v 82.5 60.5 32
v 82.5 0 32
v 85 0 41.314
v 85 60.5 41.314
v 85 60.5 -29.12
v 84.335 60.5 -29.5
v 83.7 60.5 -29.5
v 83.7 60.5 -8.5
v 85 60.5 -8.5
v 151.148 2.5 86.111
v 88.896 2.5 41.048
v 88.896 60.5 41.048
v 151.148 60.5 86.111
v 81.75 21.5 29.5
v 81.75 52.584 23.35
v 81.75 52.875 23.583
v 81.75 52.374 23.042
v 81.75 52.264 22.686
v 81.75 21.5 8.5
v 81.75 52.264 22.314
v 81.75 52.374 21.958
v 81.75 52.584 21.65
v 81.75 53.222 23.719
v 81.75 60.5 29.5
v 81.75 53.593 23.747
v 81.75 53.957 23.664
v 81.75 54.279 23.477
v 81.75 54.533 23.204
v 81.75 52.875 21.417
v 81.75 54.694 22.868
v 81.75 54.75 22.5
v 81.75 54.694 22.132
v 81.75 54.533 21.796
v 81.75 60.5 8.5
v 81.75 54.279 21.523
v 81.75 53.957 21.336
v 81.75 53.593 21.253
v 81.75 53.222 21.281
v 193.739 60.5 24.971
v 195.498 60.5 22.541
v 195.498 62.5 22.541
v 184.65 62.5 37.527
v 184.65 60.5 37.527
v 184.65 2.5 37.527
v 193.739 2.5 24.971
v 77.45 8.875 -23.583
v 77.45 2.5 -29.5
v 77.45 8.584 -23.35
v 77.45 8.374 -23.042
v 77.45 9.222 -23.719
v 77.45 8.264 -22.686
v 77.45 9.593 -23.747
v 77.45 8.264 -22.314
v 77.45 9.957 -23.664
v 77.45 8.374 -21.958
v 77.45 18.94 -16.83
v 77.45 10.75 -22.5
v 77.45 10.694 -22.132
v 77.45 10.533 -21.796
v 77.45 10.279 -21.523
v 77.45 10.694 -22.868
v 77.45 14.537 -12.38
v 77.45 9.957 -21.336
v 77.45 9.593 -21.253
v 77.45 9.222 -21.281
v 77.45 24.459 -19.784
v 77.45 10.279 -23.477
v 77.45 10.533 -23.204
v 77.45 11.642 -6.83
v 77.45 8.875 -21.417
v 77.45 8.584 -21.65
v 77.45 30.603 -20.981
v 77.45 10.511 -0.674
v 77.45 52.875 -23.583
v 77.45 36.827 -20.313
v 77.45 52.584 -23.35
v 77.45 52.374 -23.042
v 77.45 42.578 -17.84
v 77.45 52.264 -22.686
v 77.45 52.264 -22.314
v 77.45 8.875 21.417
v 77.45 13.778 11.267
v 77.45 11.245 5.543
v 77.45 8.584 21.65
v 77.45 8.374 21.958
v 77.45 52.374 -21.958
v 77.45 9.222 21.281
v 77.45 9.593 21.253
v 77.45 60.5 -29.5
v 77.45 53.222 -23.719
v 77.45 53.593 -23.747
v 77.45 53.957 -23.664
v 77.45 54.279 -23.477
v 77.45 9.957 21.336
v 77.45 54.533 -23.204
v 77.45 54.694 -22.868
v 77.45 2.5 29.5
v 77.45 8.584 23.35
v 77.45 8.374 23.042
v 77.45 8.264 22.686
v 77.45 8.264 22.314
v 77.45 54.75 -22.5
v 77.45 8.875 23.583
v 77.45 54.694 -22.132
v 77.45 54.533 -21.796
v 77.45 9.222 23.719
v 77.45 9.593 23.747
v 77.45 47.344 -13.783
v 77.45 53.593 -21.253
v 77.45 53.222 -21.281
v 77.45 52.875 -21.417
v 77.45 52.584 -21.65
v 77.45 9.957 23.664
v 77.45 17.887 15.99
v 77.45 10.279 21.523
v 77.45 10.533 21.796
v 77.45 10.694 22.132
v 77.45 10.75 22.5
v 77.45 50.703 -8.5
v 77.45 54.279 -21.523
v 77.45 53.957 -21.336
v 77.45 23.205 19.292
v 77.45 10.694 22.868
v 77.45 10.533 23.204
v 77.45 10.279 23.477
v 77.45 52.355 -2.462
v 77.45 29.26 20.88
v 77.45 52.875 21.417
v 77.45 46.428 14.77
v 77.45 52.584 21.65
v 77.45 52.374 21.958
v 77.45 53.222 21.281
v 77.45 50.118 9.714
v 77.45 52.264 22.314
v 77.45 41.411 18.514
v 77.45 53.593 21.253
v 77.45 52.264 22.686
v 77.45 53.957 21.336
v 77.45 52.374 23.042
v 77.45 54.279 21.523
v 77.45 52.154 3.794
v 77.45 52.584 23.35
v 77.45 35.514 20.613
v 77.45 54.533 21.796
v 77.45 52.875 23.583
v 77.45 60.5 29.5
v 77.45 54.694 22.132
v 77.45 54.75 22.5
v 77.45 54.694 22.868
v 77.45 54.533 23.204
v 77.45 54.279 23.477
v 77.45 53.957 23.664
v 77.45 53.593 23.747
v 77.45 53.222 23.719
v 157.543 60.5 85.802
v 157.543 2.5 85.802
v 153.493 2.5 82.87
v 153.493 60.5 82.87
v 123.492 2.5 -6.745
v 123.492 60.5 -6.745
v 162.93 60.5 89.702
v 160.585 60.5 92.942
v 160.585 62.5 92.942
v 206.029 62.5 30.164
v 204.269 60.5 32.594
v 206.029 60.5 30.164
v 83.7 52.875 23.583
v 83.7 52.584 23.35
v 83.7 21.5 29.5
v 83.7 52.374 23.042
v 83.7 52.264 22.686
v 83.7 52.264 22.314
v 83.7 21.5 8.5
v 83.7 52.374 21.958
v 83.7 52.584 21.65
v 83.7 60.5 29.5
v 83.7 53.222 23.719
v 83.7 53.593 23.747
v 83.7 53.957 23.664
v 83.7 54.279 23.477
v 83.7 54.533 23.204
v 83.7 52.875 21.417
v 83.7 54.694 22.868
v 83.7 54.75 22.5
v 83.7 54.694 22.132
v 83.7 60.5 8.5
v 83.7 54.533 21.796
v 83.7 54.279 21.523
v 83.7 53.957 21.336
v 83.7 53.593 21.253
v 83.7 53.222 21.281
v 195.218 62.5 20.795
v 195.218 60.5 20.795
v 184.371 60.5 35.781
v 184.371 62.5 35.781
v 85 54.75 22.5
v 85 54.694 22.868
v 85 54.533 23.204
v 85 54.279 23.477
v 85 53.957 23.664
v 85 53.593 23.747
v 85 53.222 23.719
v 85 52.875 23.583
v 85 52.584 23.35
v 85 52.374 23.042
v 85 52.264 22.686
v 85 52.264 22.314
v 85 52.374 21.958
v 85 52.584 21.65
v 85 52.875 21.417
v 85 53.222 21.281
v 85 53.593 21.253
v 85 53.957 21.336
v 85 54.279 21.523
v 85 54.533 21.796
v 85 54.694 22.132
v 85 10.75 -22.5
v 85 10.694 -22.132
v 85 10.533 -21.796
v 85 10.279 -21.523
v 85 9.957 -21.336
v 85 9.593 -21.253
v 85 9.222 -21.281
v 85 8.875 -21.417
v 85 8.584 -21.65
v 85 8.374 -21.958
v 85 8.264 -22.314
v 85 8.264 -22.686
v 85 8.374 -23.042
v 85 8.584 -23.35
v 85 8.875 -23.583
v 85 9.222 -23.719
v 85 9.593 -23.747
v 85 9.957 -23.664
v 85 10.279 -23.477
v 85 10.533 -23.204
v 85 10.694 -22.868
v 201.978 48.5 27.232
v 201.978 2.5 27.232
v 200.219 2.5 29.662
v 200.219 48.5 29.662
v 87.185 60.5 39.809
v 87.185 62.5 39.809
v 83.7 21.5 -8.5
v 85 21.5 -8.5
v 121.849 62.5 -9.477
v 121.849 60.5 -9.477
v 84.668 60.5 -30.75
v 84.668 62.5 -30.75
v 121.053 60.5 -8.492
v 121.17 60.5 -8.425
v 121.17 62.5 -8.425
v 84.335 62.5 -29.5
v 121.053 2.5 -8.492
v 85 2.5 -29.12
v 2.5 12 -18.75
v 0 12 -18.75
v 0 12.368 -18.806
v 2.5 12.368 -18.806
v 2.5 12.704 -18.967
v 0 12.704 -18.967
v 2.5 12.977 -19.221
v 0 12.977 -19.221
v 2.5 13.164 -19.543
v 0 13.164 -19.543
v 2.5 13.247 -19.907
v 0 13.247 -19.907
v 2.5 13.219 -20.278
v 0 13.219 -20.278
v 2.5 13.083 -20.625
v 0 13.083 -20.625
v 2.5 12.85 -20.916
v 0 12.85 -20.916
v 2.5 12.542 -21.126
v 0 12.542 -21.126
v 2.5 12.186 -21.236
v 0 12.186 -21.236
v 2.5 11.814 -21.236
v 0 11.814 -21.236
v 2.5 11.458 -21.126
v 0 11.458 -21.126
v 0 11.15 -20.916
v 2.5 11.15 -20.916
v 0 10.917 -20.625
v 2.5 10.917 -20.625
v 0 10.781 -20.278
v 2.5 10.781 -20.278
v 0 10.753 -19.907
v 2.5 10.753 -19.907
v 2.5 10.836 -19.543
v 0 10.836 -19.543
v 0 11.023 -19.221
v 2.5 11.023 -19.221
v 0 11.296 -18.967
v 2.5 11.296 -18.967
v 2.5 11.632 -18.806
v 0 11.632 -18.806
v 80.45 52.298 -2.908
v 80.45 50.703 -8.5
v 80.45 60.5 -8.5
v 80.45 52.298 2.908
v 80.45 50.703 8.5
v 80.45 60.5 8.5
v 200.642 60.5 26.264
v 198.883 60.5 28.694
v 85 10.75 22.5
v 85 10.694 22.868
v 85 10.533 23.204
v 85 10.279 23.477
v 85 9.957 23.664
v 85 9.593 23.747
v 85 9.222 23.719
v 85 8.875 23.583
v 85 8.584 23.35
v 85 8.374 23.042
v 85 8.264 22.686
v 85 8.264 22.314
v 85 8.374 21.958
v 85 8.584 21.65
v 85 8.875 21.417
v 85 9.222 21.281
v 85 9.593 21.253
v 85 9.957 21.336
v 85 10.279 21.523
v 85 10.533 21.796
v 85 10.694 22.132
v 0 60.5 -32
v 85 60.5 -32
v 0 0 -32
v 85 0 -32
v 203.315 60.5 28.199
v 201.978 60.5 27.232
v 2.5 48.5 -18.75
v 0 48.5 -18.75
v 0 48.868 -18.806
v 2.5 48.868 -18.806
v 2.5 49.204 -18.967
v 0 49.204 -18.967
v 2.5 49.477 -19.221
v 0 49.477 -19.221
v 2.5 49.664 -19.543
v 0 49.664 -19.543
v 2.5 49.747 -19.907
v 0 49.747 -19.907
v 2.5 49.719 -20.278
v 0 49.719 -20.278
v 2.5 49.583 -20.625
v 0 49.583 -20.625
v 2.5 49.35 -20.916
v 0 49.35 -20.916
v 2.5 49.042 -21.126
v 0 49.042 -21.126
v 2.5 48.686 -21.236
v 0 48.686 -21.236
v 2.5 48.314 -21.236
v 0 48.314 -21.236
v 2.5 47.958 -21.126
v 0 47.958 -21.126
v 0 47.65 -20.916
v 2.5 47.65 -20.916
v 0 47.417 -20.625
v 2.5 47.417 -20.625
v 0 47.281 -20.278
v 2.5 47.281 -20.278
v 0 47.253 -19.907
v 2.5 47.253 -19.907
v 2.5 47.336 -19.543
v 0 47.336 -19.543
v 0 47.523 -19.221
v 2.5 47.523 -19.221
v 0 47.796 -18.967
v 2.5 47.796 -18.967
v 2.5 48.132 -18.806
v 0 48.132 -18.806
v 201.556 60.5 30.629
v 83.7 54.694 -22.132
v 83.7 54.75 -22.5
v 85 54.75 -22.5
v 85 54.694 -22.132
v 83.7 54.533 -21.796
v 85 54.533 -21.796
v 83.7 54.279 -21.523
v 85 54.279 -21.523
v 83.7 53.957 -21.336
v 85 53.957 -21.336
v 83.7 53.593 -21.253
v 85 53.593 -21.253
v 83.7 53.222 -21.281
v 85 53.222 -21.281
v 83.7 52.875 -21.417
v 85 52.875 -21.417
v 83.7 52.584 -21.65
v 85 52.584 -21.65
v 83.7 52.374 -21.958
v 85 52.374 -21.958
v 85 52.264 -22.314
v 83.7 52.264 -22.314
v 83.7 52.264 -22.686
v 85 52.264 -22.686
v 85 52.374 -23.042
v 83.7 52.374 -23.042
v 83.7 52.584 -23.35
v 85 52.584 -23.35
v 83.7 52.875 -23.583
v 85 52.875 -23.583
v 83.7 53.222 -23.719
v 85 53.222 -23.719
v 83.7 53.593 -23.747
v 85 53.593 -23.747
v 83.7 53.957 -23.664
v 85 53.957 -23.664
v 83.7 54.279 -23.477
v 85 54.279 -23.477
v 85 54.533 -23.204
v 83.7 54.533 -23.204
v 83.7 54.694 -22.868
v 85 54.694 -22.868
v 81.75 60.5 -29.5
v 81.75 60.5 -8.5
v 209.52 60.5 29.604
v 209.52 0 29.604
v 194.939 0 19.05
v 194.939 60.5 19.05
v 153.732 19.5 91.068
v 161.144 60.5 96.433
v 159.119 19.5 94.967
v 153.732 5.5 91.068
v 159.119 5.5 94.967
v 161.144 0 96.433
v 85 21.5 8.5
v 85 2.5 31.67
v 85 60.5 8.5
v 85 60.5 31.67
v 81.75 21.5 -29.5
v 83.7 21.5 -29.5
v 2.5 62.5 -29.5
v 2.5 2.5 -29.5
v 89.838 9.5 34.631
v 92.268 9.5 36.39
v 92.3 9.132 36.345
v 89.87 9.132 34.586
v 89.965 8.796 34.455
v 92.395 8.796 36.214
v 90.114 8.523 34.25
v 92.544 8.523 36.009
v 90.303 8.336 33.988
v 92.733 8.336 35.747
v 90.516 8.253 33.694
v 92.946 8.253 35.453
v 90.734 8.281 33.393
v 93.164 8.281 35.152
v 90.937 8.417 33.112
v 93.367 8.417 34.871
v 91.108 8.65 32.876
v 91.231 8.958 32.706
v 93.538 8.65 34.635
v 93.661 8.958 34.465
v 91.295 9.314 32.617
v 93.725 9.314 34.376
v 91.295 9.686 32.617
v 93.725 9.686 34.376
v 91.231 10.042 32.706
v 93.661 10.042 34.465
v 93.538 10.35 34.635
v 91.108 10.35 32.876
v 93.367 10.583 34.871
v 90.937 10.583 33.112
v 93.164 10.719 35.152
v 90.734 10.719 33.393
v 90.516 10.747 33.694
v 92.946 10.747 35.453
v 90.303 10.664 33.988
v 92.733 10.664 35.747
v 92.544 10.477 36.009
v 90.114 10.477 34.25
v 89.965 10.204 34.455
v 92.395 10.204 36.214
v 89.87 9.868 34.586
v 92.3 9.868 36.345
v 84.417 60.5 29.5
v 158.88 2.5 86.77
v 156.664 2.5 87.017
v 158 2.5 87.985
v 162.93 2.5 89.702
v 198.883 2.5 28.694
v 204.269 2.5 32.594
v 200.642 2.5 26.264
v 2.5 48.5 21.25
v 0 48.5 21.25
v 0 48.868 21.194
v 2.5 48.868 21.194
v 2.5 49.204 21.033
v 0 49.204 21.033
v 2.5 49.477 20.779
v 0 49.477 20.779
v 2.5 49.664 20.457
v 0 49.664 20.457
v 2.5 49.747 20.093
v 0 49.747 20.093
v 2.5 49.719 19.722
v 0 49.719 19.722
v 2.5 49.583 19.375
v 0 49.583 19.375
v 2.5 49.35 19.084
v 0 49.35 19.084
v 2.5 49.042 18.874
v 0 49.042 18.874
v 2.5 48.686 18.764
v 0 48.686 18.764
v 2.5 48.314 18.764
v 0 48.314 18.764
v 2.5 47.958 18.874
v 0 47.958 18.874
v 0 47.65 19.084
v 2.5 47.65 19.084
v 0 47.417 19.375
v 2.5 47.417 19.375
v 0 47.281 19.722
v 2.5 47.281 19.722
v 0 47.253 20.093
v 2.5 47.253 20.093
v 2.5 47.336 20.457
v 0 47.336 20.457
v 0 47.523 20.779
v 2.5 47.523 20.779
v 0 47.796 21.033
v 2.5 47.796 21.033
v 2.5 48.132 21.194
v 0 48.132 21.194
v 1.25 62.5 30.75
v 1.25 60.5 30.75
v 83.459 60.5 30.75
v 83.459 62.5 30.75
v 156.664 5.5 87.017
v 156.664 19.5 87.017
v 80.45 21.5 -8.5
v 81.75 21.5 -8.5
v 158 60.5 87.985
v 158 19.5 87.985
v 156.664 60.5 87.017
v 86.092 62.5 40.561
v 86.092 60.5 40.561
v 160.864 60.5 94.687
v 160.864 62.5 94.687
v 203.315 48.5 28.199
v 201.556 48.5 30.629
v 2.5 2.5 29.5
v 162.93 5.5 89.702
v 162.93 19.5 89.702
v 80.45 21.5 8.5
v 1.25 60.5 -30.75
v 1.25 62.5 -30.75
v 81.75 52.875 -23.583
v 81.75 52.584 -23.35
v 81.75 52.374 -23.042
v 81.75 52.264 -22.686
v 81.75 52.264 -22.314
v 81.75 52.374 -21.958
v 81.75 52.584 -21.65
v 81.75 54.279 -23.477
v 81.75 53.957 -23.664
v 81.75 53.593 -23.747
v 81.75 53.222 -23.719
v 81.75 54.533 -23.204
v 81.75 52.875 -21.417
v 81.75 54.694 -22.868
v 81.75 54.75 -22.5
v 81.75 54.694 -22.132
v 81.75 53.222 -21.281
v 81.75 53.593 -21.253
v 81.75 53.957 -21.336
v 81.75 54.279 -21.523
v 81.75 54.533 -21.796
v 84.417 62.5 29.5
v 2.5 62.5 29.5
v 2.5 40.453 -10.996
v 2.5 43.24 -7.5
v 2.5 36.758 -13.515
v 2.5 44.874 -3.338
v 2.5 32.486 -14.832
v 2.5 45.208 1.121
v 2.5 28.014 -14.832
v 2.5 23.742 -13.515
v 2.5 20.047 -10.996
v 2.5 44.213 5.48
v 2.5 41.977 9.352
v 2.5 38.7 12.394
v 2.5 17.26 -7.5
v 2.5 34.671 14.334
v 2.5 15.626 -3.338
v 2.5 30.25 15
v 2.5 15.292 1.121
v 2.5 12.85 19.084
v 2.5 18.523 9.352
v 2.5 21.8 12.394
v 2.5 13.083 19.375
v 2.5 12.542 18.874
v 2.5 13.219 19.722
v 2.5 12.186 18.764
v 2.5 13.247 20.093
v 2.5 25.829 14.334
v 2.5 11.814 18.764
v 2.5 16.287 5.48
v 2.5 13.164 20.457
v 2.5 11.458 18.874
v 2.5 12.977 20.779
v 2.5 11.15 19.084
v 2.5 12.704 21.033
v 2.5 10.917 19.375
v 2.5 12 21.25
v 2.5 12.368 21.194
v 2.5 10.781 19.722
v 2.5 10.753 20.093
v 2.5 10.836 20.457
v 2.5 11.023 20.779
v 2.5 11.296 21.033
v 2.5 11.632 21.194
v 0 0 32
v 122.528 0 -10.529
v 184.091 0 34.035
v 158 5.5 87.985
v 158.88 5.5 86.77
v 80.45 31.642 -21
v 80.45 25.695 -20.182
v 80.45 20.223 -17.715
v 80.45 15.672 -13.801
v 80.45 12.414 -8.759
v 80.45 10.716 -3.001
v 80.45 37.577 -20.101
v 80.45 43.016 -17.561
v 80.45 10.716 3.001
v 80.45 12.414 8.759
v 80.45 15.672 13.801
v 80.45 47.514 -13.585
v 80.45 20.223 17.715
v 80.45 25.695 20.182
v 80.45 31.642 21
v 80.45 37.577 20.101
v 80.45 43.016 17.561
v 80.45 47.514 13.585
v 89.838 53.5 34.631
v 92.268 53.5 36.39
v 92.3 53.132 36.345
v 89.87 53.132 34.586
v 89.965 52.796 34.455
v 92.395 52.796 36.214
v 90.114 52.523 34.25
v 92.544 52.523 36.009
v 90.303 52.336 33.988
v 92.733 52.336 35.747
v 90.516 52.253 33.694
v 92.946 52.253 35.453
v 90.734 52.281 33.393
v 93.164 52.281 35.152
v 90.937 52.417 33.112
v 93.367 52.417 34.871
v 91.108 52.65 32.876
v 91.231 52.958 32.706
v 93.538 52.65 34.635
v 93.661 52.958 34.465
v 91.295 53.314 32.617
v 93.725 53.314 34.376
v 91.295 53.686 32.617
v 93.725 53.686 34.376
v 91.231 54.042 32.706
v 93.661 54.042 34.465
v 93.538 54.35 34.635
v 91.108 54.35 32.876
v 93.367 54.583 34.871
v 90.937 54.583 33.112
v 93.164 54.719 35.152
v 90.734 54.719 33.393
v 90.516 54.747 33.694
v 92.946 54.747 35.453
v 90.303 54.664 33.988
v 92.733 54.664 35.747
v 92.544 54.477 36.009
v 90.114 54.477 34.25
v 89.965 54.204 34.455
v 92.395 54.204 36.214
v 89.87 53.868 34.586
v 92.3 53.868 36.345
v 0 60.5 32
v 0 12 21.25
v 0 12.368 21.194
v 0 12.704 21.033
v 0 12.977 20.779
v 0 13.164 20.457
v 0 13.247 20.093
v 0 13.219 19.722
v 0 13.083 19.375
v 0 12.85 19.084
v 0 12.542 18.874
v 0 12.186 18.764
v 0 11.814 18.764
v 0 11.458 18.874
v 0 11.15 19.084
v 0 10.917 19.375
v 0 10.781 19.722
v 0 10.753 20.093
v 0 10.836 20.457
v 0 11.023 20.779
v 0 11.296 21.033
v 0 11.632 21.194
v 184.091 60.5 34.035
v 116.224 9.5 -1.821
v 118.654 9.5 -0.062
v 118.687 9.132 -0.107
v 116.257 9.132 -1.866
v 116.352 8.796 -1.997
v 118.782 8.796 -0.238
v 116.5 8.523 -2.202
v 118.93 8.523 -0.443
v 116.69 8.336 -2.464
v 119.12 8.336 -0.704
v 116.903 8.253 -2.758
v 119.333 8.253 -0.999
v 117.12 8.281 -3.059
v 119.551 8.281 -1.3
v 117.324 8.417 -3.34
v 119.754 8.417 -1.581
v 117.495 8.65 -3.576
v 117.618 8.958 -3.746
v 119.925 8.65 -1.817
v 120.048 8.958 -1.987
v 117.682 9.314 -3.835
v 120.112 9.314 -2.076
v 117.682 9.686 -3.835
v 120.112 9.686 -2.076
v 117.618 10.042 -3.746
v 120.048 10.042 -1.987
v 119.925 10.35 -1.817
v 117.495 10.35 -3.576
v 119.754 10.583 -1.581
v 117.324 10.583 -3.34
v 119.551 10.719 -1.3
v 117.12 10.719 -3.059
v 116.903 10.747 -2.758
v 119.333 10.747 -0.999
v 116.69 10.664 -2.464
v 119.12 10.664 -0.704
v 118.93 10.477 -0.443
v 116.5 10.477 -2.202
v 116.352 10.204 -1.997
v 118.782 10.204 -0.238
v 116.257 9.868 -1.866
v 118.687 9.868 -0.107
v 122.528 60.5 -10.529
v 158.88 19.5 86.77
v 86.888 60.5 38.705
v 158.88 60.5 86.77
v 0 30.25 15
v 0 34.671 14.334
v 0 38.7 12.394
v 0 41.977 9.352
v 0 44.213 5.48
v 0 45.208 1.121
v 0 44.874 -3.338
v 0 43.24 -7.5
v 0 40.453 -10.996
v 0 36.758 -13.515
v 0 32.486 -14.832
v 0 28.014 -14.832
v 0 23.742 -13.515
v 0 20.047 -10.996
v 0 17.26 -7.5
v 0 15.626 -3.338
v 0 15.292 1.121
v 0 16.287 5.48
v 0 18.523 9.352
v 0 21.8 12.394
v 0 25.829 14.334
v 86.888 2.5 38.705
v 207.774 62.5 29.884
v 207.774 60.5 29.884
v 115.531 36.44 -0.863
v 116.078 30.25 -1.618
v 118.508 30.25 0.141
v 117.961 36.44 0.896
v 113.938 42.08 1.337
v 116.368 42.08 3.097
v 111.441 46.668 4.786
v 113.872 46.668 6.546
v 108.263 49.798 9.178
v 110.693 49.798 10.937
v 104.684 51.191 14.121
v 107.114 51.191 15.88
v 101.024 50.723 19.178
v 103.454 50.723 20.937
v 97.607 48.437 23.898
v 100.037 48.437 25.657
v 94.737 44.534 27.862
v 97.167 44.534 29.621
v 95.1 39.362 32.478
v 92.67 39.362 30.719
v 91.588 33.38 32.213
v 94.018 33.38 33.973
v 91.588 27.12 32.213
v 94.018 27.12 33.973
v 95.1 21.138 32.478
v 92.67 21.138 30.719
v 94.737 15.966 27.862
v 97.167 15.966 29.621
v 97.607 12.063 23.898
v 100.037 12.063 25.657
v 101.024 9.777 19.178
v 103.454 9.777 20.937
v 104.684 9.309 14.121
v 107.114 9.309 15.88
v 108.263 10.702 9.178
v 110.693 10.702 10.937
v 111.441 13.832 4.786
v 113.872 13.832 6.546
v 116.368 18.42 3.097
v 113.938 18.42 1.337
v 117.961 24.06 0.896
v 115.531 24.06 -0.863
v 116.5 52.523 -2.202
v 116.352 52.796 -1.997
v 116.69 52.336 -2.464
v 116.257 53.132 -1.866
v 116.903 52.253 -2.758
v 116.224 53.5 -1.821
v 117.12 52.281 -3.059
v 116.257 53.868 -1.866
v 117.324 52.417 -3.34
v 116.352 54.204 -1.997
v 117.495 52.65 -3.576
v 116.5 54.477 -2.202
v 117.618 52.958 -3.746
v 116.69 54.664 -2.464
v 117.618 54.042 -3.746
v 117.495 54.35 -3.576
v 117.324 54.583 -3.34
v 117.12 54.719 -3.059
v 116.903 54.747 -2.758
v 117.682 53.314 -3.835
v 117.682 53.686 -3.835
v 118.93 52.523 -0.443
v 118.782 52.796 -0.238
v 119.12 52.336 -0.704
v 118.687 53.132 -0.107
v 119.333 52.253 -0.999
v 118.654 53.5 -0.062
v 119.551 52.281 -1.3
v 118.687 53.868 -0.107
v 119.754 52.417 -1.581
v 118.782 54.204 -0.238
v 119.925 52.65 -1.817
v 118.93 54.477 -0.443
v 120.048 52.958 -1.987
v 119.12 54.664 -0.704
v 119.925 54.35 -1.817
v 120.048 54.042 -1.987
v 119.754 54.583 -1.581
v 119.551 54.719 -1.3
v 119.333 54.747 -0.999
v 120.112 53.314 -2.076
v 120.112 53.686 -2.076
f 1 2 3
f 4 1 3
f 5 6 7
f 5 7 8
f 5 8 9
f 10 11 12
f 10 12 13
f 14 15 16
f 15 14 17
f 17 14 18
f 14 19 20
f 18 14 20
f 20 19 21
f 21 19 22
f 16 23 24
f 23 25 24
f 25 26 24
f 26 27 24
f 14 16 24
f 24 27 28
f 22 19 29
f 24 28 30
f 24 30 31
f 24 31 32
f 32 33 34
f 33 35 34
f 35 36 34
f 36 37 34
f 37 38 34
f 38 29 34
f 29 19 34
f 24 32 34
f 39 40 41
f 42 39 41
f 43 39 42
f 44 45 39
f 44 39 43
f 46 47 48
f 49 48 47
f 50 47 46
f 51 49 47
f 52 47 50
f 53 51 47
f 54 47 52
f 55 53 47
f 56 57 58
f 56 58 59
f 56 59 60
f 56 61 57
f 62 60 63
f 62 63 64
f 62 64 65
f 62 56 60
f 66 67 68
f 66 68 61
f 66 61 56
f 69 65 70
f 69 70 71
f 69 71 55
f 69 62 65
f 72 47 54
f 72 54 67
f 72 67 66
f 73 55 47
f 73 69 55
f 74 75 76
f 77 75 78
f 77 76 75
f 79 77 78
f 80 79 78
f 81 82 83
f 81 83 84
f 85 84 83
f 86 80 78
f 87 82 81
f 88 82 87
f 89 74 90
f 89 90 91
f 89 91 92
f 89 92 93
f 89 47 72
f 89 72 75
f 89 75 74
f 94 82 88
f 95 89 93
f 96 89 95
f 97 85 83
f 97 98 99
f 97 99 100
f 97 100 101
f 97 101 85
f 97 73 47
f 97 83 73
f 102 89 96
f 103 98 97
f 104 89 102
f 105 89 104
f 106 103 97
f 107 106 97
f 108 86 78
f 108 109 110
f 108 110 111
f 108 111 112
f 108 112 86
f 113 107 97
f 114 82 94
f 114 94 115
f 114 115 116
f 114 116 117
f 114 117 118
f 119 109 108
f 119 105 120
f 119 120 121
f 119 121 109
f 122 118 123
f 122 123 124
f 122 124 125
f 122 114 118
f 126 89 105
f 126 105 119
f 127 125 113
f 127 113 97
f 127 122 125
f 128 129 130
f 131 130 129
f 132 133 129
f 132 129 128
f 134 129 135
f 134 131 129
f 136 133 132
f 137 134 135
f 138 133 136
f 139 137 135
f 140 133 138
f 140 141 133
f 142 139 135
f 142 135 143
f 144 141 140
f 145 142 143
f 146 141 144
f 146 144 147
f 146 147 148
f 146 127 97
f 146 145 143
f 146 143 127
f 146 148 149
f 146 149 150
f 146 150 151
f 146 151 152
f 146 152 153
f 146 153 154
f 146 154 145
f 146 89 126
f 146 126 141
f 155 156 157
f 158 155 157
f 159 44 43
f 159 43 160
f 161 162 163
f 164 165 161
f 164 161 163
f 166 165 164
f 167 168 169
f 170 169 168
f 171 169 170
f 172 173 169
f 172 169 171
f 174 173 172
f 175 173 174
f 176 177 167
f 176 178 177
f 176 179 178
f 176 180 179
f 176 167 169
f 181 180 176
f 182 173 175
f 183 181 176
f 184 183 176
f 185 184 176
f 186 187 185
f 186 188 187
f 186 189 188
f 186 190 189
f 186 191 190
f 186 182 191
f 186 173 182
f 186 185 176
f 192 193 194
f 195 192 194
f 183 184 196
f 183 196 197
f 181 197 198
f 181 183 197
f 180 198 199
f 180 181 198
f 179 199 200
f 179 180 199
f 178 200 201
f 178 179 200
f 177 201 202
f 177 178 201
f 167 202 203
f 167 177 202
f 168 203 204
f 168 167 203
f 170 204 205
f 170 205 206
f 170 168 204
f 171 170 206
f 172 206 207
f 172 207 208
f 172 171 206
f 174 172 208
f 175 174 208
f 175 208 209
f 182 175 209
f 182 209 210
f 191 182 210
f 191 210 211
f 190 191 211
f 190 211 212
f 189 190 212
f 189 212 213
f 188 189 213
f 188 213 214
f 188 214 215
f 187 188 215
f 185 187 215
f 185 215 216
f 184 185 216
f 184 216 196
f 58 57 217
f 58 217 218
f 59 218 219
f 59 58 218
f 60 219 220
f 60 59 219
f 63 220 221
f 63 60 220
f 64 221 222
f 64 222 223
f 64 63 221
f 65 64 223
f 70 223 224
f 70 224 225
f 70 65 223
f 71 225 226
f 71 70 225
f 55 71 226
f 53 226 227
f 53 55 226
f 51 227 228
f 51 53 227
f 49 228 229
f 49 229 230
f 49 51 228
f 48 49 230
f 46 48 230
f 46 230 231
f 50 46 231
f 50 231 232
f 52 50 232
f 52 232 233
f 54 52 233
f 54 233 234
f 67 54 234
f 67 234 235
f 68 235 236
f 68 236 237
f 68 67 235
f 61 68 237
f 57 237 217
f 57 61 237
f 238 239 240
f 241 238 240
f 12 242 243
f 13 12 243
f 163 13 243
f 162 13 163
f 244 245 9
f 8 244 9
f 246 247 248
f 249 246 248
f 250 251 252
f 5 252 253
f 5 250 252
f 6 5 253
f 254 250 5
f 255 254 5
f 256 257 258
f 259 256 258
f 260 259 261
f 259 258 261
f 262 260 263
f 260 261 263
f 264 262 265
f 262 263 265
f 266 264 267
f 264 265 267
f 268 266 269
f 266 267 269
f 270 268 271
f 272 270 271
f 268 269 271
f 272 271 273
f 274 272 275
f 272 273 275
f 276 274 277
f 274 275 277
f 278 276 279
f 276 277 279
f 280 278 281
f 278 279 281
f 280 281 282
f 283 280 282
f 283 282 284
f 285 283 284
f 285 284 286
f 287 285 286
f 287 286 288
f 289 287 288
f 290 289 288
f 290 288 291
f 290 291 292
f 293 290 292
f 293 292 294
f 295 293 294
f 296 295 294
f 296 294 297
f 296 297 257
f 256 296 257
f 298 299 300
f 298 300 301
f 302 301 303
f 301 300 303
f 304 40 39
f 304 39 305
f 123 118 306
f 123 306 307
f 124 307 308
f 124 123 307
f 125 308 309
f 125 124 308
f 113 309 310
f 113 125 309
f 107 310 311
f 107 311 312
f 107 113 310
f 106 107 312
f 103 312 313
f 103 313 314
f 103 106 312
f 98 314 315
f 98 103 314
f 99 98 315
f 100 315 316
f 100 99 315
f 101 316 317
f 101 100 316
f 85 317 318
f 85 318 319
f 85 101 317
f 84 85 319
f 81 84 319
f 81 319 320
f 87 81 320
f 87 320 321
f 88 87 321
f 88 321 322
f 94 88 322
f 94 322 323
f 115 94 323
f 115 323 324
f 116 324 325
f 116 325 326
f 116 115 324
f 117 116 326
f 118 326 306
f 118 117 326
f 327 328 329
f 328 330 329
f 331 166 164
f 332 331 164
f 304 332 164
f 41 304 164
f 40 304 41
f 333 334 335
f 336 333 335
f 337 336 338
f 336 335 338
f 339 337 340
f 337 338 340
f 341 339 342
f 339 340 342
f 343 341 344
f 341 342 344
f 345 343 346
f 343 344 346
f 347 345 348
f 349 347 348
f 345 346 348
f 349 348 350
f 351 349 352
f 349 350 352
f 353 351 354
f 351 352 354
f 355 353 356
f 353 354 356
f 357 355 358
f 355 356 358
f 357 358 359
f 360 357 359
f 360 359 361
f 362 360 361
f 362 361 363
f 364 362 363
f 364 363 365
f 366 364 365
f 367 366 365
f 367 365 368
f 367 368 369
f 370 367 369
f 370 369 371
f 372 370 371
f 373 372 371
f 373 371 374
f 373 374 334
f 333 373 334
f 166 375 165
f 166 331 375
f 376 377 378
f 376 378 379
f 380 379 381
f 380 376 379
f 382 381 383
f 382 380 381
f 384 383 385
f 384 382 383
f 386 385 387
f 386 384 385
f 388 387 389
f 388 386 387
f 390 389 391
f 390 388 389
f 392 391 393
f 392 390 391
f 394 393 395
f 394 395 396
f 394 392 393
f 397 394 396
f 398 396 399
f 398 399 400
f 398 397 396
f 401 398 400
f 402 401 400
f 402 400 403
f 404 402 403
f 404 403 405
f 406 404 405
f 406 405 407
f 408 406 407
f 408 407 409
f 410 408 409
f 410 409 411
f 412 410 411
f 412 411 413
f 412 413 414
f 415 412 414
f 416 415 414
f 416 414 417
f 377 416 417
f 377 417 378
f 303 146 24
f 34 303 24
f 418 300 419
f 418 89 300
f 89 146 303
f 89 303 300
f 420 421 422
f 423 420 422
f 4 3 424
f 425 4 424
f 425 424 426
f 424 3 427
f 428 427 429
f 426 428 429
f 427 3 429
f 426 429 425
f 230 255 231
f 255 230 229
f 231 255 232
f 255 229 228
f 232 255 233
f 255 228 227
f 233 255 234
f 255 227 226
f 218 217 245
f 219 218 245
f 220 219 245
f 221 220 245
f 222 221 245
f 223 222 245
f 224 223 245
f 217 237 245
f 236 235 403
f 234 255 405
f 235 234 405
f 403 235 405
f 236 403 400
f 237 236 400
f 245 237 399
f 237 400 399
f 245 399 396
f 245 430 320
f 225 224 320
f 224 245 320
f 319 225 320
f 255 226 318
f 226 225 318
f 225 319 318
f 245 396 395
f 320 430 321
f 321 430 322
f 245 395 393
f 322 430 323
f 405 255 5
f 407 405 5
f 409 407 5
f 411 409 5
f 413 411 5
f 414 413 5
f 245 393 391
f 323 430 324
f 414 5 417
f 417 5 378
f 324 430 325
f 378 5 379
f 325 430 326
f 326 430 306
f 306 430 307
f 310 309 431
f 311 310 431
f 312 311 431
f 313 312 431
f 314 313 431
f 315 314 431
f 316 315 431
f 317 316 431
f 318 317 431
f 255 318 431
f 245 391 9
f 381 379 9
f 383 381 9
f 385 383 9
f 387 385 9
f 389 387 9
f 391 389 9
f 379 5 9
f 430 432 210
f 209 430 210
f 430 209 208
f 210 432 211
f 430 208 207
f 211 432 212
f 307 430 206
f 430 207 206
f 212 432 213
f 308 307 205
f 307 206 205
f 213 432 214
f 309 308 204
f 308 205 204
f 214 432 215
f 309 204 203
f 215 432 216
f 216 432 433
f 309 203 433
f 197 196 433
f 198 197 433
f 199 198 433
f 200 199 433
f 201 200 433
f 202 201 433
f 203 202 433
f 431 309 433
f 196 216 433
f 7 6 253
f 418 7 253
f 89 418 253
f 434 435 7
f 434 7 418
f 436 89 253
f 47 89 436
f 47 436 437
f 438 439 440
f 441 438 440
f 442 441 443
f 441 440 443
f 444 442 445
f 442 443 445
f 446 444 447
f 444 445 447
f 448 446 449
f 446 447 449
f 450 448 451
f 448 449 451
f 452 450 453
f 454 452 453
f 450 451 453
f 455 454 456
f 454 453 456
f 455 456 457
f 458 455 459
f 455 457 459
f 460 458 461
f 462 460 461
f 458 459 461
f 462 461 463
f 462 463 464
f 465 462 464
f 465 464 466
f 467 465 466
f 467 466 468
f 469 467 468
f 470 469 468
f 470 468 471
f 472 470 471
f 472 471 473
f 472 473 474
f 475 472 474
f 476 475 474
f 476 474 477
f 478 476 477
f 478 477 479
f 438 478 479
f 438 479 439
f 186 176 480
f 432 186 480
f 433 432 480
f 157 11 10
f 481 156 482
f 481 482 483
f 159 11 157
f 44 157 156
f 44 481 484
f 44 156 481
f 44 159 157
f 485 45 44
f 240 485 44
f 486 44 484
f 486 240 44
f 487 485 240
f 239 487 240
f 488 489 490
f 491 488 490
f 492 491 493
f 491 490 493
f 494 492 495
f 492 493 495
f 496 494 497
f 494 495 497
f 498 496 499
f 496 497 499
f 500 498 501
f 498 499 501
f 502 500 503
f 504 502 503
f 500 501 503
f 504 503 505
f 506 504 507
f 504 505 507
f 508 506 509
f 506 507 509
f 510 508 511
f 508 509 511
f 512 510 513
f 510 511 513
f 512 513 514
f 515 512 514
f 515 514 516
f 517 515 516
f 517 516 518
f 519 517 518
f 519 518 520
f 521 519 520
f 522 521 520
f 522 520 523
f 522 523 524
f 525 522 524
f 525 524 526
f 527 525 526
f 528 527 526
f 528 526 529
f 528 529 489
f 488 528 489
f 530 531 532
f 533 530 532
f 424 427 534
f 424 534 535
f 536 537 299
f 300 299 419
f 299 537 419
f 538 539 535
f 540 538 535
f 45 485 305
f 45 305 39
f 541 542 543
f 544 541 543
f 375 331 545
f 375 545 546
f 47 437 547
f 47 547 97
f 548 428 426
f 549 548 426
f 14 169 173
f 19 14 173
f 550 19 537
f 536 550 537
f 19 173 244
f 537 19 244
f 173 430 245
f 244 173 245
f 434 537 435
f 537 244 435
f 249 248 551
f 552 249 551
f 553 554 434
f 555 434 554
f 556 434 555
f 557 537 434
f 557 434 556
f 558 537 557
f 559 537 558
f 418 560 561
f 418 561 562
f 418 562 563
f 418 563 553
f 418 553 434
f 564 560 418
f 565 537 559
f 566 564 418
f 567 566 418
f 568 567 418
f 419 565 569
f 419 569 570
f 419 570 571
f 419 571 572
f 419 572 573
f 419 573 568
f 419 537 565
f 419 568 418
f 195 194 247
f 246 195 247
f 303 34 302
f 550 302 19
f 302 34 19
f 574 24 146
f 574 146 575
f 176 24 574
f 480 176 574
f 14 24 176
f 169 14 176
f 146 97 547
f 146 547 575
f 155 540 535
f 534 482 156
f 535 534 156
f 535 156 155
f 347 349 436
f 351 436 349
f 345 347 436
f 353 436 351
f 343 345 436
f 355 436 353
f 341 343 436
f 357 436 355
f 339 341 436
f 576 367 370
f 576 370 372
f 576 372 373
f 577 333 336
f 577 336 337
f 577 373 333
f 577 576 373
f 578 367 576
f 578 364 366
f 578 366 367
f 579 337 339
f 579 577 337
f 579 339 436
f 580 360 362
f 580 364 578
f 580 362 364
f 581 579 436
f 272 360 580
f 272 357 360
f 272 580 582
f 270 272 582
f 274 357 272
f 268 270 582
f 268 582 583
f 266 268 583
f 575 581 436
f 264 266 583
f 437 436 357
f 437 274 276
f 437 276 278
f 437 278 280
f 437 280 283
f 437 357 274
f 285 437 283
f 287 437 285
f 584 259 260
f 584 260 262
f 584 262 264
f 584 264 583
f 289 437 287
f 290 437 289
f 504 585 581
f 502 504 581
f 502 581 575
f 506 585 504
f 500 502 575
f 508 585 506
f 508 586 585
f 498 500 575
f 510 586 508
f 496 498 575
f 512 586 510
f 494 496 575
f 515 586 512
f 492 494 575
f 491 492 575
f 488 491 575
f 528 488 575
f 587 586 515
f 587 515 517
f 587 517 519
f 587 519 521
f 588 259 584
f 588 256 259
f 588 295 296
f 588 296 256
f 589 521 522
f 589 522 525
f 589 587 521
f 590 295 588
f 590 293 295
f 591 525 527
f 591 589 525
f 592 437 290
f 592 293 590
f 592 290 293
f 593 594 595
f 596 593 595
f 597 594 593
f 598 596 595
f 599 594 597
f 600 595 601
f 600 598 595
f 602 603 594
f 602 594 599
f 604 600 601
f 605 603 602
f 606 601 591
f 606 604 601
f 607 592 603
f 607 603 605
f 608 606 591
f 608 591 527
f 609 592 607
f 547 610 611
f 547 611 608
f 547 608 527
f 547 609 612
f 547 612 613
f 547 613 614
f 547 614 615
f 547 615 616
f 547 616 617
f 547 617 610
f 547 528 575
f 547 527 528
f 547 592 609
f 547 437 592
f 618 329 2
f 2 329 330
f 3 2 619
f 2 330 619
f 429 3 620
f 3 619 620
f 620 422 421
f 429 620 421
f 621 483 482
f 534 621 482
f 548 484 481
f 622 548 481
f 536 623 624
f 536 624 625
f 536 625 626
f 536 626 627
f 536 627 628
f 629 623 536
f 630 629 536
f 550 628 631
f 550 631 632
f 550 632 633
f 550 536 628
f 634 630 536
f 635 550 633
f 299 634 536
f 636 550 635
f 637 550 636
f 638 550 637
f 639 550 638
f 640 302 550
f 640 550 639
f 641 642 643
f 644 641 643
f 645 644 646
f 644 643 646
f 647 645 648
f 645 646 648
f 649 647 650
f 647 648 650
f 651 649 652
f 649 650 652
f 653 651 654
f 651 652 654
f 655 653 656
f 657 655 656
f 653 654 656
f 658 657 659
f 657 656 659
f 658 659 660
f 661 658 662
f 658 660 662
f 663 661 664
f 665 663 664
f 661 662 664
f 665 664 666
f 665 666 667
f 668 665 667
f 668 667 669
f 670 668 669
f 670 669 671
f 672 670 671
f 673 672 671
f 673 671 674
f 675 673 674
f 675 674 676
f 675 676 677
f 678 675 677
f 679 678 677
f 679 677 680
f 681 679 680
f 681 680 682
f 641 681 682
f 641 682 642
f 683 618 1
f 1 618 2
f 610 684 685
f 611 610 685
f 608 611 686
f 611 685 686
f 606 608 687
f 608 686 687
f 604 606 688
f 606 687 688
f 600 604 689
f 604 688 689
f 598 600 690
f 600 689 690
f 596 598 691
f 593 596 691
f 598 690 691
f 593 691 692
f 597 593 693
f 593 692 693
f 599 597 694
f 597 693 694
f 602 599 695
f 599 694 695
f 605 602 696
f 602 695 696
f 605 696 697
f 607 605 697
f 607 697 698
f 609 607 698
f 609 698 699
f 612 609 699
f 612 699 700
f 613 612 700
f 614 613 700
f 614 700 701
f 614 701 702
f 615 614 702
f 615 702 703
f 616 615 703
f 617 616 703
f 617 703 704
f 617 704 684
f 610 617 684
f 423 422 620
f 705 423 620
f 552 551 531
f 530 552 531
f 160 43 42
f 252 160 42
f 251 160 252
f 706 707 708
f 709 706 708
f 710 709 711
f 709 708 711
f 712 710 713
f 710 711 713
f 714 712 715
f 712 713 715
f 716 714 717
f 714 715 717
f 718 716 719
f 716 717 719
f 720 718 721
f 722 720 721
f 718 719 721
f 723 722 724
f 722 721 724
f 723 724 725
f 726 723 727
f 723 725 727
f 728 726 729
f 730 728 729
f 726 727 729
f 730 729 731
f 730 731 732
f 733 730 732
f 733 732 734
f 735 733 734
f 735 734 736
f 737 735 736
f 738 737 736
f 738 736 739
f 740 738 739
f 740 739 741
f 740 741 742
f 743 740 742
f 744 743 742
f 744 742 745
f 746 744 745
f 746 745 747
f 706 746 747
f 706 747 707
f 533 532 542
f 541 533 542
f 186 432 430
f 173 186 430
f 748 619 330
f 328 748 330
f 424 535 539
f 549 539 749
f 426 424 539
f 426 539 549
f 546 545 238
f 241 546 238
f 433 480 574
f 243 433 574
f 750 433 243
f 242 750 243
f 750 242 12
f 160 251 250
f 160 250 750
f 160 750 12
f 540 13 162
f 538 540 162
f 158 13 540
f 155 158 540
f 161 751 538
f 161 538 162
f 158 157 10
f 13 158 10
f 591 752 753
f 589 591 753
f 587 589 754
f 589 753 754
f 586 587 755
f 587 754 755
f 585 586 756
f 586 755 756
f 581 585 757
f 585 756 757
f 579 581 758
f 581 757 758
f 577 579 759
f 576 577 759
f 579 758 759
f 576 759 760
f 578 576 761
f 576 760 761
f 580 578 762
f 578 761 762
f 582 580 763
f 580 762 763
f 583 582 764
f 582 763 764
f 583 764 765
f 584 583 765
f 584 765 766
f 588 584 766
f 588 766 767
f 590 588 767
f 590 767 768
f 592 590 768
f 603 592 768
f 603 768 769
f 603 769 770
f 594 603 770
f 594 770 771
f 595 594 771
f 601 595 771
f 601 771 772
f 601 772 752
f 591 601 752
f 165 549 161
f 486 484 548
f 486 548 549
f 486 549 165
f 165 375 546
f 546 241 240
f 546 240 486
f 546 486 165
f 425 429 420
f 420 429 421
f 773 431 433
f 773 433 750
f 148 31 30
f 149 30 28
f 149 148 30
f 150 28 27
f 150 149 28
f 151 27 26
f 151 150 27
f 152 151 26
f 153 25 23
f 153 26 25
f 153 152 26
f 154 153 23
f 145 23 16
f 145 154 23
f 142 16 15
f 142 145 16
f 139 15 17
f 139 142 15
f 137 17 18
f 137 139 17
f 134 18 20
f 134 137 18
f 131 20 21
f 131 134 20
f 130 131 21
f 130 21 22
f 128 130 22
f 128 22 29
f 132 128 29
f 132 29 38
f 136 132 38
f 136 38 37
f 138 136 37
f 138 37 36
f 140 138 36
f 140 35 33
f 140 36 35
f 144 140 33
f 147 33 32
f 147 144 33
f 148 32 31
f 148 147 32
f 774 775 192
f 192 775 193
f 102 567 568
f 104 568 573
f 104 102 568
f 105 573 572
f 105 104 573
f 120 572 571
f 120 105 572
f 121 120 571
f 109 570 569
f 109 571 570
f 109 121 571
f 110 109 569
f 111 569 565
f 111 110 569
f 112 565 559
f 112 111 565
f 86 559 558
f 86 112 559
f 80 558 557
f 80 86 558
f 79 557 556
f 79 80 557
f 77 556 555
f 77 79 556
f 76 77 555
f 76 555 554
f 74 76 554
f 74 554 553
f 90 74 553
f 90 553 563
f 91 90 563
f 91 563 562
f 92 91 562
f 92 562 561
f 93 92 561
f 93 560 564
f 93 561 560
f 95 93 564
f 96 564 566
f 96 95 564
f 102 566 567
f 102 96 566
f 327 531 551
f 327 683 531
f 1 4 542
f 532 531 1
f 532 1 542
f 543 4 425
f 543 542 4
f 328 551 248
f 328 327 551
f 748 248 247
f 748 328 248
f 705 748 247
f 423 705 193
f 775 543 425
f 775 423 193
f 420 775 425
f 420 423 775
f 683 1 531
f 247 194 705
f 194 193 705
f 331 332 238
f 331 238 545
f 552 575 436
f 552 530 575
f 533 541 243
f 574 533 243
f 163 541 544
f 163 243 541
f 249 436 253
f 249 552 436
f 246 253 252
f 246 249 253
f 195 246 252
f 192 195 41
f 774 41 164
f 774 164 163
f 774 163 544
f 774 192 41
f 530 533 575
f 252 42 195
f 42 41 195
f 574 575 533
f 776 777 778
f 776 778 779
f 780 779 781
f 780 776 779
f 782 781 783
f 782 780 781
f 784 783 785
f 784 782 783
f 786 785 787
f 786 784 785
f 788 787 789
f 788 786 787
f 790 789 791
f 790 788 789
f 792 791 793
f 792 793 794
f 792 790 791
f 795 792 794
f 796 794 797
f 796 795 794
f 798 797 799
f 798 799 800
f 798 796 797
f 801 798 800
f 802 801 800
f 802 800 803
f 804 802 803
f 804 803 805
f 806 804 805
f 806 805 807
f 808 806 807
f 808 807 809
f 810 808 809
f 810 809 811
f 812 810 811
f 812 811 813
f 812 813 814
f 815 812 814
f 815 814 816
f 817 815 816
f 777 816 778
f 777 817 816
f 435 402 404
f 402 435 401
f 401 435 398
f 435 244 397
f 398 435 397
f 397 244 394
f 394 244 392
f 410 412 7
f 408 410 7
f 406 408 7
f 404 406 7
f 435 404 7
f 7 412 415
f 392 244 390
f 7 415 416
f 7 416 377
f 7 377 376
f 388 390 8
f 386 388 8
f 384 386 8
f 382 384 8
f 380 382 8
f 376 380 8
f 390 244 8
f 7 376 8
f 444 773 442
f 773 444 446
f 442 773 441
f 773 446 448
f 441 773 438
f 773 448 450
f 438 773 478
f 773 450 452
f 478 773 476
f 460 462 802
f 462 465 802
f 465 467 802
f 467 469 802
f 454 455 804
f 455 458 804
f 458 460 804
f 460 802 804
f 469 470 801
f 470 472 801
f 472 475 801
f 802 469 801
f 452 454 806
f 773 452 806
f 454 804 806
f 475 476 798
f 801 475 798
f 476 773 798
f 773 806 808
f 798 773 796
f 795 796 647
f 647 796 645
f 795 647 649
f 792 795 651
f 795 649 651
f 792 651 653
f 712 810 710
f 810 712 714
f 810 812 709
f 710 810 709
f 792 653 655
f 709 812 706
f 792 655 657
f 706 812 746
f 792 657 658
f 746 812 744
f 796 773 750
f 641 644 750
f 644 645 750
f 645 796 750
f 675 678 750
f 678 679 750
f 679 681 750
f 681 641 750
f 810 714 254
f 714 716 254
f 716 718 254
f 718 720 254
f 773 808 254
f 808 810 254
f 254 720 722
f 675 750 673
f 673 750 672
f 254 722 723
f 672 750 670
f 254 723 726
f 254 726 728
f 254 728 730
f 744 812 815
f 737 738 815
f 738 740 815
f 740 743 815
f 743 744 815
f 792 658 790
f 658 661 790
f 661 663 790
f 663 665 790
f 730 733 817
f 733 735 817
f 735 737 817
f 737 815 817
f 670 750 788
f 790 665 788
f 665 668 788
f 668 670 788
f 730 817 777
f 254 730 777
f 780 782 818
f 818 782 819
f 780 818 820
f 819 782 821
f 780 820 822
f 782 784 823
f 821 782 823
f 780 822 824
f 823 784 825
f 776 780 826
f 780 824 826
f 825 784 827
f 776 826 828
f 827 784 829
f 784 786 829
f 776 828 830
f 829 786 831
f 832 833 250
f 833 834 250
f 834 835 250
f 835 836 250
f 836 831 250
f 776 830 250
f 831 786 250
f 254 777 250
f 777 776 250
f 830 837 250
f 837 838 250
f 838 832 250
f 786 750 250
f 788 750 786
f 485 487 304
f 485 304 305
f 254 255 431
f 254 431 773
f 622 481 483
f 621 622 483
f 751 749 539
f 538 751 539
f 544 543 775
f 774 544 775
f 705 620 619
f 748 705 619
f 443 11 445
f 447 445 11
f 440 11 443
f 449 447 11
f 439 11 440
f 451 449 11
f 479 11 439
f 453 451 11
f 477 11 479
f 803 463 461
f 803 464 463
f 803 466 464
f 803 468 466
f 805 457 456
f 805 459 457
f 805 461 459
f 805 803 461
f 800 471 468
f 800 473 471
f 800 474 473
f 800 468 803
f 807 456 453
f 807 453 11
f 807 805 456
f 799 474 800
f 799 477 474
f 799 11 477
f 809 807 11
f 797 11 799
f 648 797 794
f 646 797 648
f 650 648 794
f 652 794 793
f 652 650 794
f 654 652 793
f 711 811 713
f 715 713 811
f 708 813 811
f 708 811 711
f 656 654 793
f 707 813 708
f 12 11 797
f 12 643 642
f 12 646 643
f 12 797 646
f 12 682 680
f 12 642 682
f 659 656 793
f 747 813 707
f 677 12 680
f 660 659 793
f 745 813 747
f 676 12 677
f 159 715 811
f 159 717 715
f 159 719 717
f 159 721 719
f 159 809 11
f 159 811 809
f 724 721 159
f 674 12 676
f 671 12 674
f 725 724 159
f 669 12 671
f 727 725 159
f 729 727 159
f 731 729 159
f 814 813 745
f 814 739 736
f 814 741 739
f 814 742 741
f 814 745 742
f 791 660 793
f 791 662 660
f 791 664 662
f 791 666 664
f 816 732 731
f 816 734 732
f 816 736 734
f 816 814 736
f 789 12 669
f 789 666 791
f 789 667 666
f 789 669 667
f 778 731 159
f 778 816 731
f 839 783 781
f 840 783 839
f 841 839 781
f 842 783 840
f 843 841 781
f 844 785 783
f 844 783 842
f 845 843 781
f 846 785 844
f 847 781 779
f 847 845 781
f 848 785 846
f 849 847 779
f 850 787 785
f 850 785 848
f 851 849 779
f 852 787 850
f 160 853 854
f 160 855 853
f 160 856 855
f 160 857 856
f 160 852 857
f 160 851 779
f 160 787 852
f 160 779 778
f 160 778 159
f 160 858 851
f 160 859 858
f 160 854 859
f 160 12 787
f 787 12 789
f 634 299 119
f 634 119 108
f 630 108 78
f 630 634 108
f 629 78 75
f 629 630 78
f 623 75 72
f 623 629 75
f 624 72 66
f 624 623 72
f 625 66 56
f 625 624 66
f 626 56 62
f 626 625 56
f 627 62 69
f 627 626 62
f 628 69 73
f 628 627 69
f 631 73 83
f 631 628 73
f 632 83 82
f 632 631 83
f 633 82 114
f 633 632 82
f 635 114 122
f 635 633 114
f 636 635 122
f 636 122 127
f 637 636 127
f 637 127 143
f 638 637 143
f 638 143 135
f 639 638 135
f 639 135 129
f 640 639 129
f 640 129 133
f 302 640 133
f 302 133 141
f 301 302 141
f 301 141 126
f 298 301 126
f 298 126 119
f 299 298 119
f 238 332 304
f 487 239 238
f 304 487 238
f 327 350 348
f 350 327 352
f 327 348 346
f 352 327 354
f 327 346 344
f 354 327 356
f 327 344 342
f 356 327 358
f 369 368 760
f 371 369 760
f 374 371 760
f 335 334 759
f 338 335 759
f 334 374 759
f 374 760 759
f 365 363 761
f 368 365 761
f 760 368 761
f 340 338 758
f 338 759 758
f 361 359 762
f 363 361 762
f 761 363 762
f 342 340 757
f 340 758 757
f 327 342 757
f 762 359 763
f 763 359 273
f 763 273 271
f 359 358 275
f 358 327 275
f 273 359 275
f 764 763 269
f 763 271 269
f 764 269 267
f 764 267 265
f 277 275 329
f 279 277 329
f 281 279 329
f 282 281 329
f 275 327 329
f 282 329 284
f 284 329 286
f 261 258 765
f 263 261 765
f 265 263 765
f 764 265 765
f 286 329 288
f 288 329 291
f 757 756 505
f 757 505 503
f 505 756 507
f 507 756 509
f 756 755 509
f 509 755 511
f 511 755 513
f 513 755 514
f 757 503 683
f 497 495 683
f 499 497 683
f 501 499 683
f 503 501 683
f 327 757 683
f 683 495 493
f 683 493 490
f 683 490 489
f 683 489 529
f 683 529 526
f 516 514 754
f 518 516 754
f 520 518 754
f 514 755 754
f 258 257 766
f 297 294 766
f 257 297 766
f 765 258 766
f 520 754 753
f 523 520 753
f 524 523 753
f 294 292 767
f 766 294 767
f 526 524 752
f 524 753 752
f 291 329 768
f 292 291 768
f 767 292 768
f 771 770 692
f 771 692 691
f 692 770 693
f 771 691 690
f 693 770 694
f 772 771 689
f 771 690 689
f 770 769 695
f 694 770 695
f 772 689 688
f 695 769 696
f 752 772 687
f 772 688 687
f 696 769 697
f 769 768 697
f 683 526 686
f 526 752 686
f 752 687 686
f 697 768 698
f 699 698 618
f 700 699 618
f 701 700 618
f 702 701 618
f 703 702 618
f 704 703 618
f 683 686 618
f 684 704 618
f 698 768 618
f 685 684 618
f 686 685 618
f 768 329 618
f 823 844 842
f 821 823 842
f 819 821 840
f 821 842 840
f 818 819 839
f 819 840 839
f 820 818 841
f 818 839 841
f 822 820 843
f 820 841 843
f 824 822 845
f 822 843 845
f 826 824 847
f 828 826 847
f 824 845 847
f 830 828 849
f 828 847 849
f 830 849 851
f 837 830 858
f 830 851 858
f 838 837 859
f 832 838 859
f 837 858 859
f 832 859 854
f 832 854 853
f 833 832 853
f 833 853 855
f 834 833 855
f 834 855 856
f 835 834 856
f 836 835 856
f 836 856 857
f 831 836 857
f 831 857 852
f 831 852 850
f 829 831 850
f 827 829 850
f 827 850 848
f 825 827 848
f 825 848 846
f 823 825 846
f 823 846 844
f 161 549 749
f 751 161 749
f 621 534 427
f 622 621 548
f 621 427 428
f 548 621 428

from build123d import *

# Parameters (mm, degrees)
EXTRUDE_1_DEPTH                 = 60.5
SHELL_1_T                       = -2.5
EXTRUDE_3_DEPTH                 = 4.55
CUT_EXTRUDE_1_REACH             = 237.14
SKETCH_7_W                      = 1.95
SKETCH_7_H                      = 39
CUT_EXTRUDE_1_DIRECTION_2_REACH = 237.14
SKETCH_8_W                      = 59
SKETCH_8_H                      = 58
SKETCH_8_R                      = 21
EXTRUDE_5_DEPTH                 = 3
HOLE_START                      = 77.45
HOLE_WIZARD_M3_1_OUTLINE_R      = 1.25
HOLE_WIZARD_M3_1_DEPTH          = 7.55
PATTERN_LINEAR_1_COUNT          = 2
PATTERN_LINEAR_1_PITCH          = 45
PATTERN_LINEAR_1_COUNT_DIR2     = 2
PATTERN_LINEAR_1_PITCH_DIR2     = 44
SKETCH_13_W                     = 64
SKETCH_13_H                     = 60.5
SKETCH_13_R                     = 21
EXTRUDE_6_DEPTH                 = 3
HOLE_WIZARD_M3_2_REACH          = 146.84
HOLE_WIZARD_M3_2_BORE_R         = 1.25
PATTERN_LINEAR_2_COUNT          = 2
PATTERN_LINEAR_2_PITCH          = 45
PATTERN_LINEAR_2_COUNT_DIR2     = 2
PATTERN_LINEAR_2_PITCH_DIR2     = 44
CUT_EXTRUDE_2_REACH             = 240.449
SKETCH_16_R                     = 15
HOLE_WIZARD_M3_3_REACH          = 240.449
HOLE_WIZARD_M3_3_BORE_R         = 1.25
PATTERN_LINEAR_3_COUNT          = 2
PATTERN_LINEAR_3_PITCH          = 40
PATTERN_LINEAR_3_COUNT_DIR2     = 2
PATTERN_LINEAR_3_PITCH_DIR2     = 36.5
EXTRUDE_7_DEPTH                 = 58
CUT_EXTRUDE_4_DEPTH             = 12
CUT_EXTRUDE_5_REACH             = 237.925
SKETCH_22_W                     = 6.65
SKETCH_22_H                     = 14
EXTRUDE_8_DEPTH                 = 2


# Read off the part's stored shape, not the designer's step: M3 螺纹孔1
with BuildPart() as part:
    # 草图2 → 凸台-拉伸1 (new body)
    with BuildSketch(Plane(origin=(0, 0, 0), x_dir=(1, 0, 0), z_dir=(0, 1, 0))):
        Polygon((0, -32), (82.5, -32), (85, -41.313840204), (161.143914202, -96.432841737), (209.519633633, -29.6044064), (194.938884105, -19.049703979), (184.090995505, -34.035474327), (122.527830831, 10.528824785), (85, 32), (0, 32), align=None)
    extrude(amount=EXTRUDE_1_DEPTH)

    # 抽壳1
    shell_1_openings = [part.faces().sort_by_distance(p)[0] for p in [
        (97.534213711, 60.5, 20.40382731),
    ]]
    offset(amount=SHELL_1_T, openings=shell_1_openings, kind=Kind.INTERSECTION)

    # 草图5 → 凸台-拉伸3 (add)
    with BuildSketch(Plane.ZY.offset(-85)):
        Polygon((-32, 60.5), (-32, 2.5), (32, 2.5), (32, 60.5), (8.5, 60.5), (8.5, 21.5), (-8.5, 21.5), (-8.5, 60.5), align=None)
    extrude(amount=EXTRUDE_3_DEPTH)

    # 切除-拉伸1: up to this face of the body (flat: up to its plane)
    cut_extrude_1_end = Plane(part.part.faces().sort_by_distance((41.475, 31.5, 29.5))[0])
    # 草图7 → 切除-拉伸1 (cut, up to the picked face)
    with BuildSketch(Plane(origin=(0, 0, 8.5), x_dir=(-1, 0, 0), z_dir=(0, 0, -1)), mode=Mode.PRIVATE) as cut_extrude_1_sk1:
        with Locations((-82.725, 41)):
            Rectangle(SKETCH_7_W, SKETCH_7_H)
    cut_extrude_1_tool1 = split(extrude(cut_extrude_1_sk1.sketch, amount=-CUT_EXTRUDE_1_REACH, mode=Mode.PRIVATE), bisect_by=cut_extrude_1_end, keep=Keep.BOTH, mode=Mode.PRIVATE)
    add(cut_extrude_1_tool1.solids().sort_by(Axis((82.725, 41, 8.5), (0, 0, 1)))[0], mode=Mode.SUBTRACT)

    # 切除-拉伸1 direction 2: up to this face of the body (flat: up to its plane)
    cut_extrude_1_direction_2_end = Plane(part.part.faces().sort_by_distance((41.475, 31.5, -29.5))[0])
    # 草图7 → 切除-拉伸1 direction 2 (cut, up to the picked face)
    with BuildSketch(Plane(origin=(0, 0, 8.5), x_dir=(-1, 0, 0), z_dir=(0, 0, -1)), mode=Mode.PRIVATE) as cut_extrude_1_direction_2_sk1:
        with Locations((-82.725, 41)):
            Rectangle(SKETCH_7_W, SKETCH_7_H)
    cut_extrude_1_direction_2_tool1 = split(extrude(cut_extrude_1_direction_2_sk1.sketch, amount=CUT_EXTRUDE_1_DIRECTION_2_REACH, mode=Mode.PRIVATE), bisect_by=cut_extrude_1_direction_2_end, keep=Keep.BOTH, mode=Mode.PRIVATE)
    add(cut_extrude_1_direction_2_tool1.solids().sort_by(Axis((82.725, 41, 8.5), (0, 0, -1)))[0], mode=Mode.SUBTRACT)

    # 草图8 → 凸台-拉伸5 (add)
    with BuildSketch(Plane.ZY.offset(-80.45)):
        with Locations((0, 31.5)):
            Rectangle(SKETCH_8_W, SKETCH_8_H)
        with Locations(Location((0, 31.5, 0), (0, 0, 113.876207731))):
            Circle(SKETCH_8_R, mode=Mode.SUBTRACT)
    extrude(amount=EXTRUDE_5_DEPTH)

    # M3 螺纹孔1 outline → M3 螺纹孔1 (cut)
    with BuildSketch(Plane.YZ.offset(HOLE_START)):
        with Locations((53.5, -22.5)):
            Circle(HOLE_WIZARD_M3_1_OUTLINE_R)
    hole_wizard_m3_1 = extrude(amount=HOLE_WIZARD_M3_1_DEPTH, mode=Mode.SUBTRACT)

    # 阵列(线性)1: Hole Wizard M3 _1 2 × 2
    with Locations(*[(0, -j * PATTERN_LINEAR_1_PITCH_DIR2, i * PATTERN_LINEAR_1_PITCH) for i in range(PATTERN_LINEAR_1_COUNT) for j in range(PATTERN_LINEAR_1_COUNT_DIR2) if (i, j) != (0, 0)]):
        add(hole_wizard_m3_1, mode=Mode.SUBTRACT)

    # 草图13 → 凸台-拉伸6 (add)
    with BuildSketch(Plane(origin=(75.397730804, 0, 54.578854835), x_dir=(0.5863723567357906, 0, -0.8100416404457952), z_dir=(0.8100416404457952, 0, 0.5863723567357906))):
        with Locations((48.375719431, 30.25)):
            Rectangle(SKETCH_13_W, SKETCH_13_H)
        with Locations((48.375719431, 30.25)):
            Circle(SKETCH_13_R, mode=Mode.SUBTRACT)
    extrude(amount=EXTRUDE_6_DEPTH)

    # M3 螺纹孔2 bore (on position points) → M3 螺纹孔2 (cut, up to next)
    with BuildSketch(Plane(origin=(93.00066231, 53.5, 35.37756169), x_dir=(-0.586372356736, 0, 0.810041640446), z_dir=(0.810041640446, 0, 0.586372356736)), mode=Mode.PRIVATE) as hole_wizard_m3_2_sk1:
        Circle(HOLE_WIZARD_M3_2_BORE_R)
    hole_wizard_m3_2_tool1 = extrude(hole_wizard_m3_2_sk1.sketch, amount=-HOLE_WIZARD_M3_2_REACH, mode=Mode.PRIVATE) & part.part
    hole_wizard_m3_2 = hole_wizard_m3_2_tool1.solids().sort_by_distance((93.000662, 53.5, 35.377562))[0]
    add(hole_wizard_m3_2, mode=Mode.SUBTRACT)

    # 阵列(线性)2: Hole Wizard M3 _2 2 × 2
    with Locations(*[Vector(0.5863723567357906, 0, -0.8100416404457951) * (i * PATTERN_LINEAR_2_PITCH) + Vector(0, -1, 0) * (j * PATTERN_LINEAR_2_PITCH_DIR2) for i in range(PATTERN_LINEAR_2_COUNT) for j in range(PATTERN_LINEAR_2_COUNT_DIR2) if (i, j) != (0, 0)]):
        add(hole_wizard_m3_2, mode=Mode.SUBTRACT)

    # 草图16 → 切除-拉伸2 (cut, up to next)
    with BuildSketch(Plane.ZY, mode=Mode.PRIVATE) as cut_extrude_2_sk1:
        with Locations((0, 30.25)):
            Circle(SKETCH_16_R)
    cut_extrude_2_tool1 = extrude(cut_extrude_2_sk1.sketch, amount=-CUT_EXTRUDE_2_REACH, mode=Mode.PRIVATE) & part.part
    add(cut_extrude_2_tool1.solids().sort_by_distance((0, 30.25, 0))[0], mode=Mode.SUBTRACT)

    # M3 螺纹孔3 bore → M3 螺纹孔3 (cut, up to next)
    with BuildSketch(Plane.ZY, mode=Mode.PRIVATE) as hole_wizard_m3_3_sk1:
        with Locations((-20, 48.5)):
            Circle(HOLE_WIZARD_M3_3_BORE_R)
    hole_wizard_m3_3_tool1 = extrude(hole_wizard_m3_3_sk1.sketch, amount=-HOLE_WIZARD_M3_3_REACH, mode=Mode.PRIVATE) & part.part
    hole_wizard_m3_3 = hole_wizard_m3_3_tool1.solids().sort_by_distance((0, 48.5, -20))[0]
    add(hole_wizard_m3_3, mode=Mode.SUBTRACT)

    # 阵列(线性)3: Hole Wizard M3 _3 2 × 2
    with Locations(*[(0, -j * PATTERN_LINEAR_3_PITCH_DIR2, i * PATTERN_LINEAR_3_PITCH) for i in range(PATTERN_LINEAR_3_COUNT) for j in range(PATTERN_LINEAR_3_COUNT_DIR2) if (i, j) != (0, 0)]):
        add(hole_wizard_m3_3, mode=Mode.SUBTRACT)

    # 草图19 → 凸台-拉伸7 (add)
    with BuildSketch(Plane(origin=(0, 2.5, 0), x_dir=(1, 0, 0), z_dir=(0, 1, 0))):
        Polygon((153.493245308, -82.870402226), (151.147755881, -86.110568788), (160.584740993, -92.941806744), (162.93023042, -89.701640182), (158.880022217, -86.769778399), (158.000463682, -87.984840859), (156.663894976, -87.017326471), (157.543453511, -85.80226401), align=None)
        Polygon((206.02859864, -30.16357961), (201.978390437, -27.231717826), (200.219273367, -29.661842747), (204.269481569, -32.593704531), align=None)
        Polygon((195.498057314, -22.540738972), (200.641821731, -26.264203437), (198.88270466, -28.694328359), (193.738940244, -24.970863893), align=None)
    extrude(amount=EXTRUDE_7_DEPTH)

    # 草图21 → 切除-拉伸4 (cut)
    with BuildSketch(Plane(origin=(0, 60.5, 0), x_dir=(1, 0, 0), z_dir=(0, 1, 0))):
        Polygon((200.219273367, -29.661842747), (201.978390437, -27.231717826), (203.314959144, -28.199232214), (201.555842074, -30.629357136), align=None)
    extrude(amount=-CUT_EXTRUDE_4_DEPTH, mode=Mode.SUBTRACT)

    # 草图22 → 切除-拉伸5 (cut, up to next)
    with BuildSketch(Plane(origin=(9.602269196, 0, -13.265014631), x_dir=(0.810041640445795, 0, 0.5863723567357908), z_dir=(-0.5863723567357908, 0, 0.810041640445795)), mode=Mode.PRIVATE) as cut_extrude_5_sk1:
        with Locations((181.253833284, 12.5)):
            Rectangle(SKETCH_22_W, SKETCH_22_H)
    cut_extrude_5_tool1 = extrude(cut_extrude_5_sk1.sketch, amount=-CUT_EXTRUDE_5_REACH, mode=Mode.PRIVATE) & part.part
    add(cut_extrude_5_tool1.solids().sort_by_distance((156.425422, 12.5, 93.017223))[0], mode=Mode.SUBTRACT)

    # 草图23 → 凸台-拉伸8 (add)
    with BuildSketch(Plane(origin=(0, 60.5, 0), x_dir=(1, 0, 0), z_dir=(0, 1, 0))):
        Polygon((1.25, 30.75), (1.25, -30.75), (83.458724754, -30.75), (86.092274477, -40.561384515), (160.864327597, -94.687324241), (207.774116136, -29.883993005), (195.218470709, -20.795221475), (184.37058211, -35.780991824), (121.849033271, 9.477061724), (84.667685679, 30.75), align=None)
        Polygon((2.5, 29.5), (2.5, -29.5), (84.417449509, -29.5), (87.184548954, -39.808928826), (160.584740993, -92.941806744), (206.02859864, -30.16357961), (195.498057314, -22.540738972), (184.650168714, -37.52650932), (121.170235712, 8.425298663), (84.335371357, 29.5), align=None, mode=Mode.SUBTRACT)
    extrude(amount=EXTRUDE_8_DEPTH)


solid = part.part
